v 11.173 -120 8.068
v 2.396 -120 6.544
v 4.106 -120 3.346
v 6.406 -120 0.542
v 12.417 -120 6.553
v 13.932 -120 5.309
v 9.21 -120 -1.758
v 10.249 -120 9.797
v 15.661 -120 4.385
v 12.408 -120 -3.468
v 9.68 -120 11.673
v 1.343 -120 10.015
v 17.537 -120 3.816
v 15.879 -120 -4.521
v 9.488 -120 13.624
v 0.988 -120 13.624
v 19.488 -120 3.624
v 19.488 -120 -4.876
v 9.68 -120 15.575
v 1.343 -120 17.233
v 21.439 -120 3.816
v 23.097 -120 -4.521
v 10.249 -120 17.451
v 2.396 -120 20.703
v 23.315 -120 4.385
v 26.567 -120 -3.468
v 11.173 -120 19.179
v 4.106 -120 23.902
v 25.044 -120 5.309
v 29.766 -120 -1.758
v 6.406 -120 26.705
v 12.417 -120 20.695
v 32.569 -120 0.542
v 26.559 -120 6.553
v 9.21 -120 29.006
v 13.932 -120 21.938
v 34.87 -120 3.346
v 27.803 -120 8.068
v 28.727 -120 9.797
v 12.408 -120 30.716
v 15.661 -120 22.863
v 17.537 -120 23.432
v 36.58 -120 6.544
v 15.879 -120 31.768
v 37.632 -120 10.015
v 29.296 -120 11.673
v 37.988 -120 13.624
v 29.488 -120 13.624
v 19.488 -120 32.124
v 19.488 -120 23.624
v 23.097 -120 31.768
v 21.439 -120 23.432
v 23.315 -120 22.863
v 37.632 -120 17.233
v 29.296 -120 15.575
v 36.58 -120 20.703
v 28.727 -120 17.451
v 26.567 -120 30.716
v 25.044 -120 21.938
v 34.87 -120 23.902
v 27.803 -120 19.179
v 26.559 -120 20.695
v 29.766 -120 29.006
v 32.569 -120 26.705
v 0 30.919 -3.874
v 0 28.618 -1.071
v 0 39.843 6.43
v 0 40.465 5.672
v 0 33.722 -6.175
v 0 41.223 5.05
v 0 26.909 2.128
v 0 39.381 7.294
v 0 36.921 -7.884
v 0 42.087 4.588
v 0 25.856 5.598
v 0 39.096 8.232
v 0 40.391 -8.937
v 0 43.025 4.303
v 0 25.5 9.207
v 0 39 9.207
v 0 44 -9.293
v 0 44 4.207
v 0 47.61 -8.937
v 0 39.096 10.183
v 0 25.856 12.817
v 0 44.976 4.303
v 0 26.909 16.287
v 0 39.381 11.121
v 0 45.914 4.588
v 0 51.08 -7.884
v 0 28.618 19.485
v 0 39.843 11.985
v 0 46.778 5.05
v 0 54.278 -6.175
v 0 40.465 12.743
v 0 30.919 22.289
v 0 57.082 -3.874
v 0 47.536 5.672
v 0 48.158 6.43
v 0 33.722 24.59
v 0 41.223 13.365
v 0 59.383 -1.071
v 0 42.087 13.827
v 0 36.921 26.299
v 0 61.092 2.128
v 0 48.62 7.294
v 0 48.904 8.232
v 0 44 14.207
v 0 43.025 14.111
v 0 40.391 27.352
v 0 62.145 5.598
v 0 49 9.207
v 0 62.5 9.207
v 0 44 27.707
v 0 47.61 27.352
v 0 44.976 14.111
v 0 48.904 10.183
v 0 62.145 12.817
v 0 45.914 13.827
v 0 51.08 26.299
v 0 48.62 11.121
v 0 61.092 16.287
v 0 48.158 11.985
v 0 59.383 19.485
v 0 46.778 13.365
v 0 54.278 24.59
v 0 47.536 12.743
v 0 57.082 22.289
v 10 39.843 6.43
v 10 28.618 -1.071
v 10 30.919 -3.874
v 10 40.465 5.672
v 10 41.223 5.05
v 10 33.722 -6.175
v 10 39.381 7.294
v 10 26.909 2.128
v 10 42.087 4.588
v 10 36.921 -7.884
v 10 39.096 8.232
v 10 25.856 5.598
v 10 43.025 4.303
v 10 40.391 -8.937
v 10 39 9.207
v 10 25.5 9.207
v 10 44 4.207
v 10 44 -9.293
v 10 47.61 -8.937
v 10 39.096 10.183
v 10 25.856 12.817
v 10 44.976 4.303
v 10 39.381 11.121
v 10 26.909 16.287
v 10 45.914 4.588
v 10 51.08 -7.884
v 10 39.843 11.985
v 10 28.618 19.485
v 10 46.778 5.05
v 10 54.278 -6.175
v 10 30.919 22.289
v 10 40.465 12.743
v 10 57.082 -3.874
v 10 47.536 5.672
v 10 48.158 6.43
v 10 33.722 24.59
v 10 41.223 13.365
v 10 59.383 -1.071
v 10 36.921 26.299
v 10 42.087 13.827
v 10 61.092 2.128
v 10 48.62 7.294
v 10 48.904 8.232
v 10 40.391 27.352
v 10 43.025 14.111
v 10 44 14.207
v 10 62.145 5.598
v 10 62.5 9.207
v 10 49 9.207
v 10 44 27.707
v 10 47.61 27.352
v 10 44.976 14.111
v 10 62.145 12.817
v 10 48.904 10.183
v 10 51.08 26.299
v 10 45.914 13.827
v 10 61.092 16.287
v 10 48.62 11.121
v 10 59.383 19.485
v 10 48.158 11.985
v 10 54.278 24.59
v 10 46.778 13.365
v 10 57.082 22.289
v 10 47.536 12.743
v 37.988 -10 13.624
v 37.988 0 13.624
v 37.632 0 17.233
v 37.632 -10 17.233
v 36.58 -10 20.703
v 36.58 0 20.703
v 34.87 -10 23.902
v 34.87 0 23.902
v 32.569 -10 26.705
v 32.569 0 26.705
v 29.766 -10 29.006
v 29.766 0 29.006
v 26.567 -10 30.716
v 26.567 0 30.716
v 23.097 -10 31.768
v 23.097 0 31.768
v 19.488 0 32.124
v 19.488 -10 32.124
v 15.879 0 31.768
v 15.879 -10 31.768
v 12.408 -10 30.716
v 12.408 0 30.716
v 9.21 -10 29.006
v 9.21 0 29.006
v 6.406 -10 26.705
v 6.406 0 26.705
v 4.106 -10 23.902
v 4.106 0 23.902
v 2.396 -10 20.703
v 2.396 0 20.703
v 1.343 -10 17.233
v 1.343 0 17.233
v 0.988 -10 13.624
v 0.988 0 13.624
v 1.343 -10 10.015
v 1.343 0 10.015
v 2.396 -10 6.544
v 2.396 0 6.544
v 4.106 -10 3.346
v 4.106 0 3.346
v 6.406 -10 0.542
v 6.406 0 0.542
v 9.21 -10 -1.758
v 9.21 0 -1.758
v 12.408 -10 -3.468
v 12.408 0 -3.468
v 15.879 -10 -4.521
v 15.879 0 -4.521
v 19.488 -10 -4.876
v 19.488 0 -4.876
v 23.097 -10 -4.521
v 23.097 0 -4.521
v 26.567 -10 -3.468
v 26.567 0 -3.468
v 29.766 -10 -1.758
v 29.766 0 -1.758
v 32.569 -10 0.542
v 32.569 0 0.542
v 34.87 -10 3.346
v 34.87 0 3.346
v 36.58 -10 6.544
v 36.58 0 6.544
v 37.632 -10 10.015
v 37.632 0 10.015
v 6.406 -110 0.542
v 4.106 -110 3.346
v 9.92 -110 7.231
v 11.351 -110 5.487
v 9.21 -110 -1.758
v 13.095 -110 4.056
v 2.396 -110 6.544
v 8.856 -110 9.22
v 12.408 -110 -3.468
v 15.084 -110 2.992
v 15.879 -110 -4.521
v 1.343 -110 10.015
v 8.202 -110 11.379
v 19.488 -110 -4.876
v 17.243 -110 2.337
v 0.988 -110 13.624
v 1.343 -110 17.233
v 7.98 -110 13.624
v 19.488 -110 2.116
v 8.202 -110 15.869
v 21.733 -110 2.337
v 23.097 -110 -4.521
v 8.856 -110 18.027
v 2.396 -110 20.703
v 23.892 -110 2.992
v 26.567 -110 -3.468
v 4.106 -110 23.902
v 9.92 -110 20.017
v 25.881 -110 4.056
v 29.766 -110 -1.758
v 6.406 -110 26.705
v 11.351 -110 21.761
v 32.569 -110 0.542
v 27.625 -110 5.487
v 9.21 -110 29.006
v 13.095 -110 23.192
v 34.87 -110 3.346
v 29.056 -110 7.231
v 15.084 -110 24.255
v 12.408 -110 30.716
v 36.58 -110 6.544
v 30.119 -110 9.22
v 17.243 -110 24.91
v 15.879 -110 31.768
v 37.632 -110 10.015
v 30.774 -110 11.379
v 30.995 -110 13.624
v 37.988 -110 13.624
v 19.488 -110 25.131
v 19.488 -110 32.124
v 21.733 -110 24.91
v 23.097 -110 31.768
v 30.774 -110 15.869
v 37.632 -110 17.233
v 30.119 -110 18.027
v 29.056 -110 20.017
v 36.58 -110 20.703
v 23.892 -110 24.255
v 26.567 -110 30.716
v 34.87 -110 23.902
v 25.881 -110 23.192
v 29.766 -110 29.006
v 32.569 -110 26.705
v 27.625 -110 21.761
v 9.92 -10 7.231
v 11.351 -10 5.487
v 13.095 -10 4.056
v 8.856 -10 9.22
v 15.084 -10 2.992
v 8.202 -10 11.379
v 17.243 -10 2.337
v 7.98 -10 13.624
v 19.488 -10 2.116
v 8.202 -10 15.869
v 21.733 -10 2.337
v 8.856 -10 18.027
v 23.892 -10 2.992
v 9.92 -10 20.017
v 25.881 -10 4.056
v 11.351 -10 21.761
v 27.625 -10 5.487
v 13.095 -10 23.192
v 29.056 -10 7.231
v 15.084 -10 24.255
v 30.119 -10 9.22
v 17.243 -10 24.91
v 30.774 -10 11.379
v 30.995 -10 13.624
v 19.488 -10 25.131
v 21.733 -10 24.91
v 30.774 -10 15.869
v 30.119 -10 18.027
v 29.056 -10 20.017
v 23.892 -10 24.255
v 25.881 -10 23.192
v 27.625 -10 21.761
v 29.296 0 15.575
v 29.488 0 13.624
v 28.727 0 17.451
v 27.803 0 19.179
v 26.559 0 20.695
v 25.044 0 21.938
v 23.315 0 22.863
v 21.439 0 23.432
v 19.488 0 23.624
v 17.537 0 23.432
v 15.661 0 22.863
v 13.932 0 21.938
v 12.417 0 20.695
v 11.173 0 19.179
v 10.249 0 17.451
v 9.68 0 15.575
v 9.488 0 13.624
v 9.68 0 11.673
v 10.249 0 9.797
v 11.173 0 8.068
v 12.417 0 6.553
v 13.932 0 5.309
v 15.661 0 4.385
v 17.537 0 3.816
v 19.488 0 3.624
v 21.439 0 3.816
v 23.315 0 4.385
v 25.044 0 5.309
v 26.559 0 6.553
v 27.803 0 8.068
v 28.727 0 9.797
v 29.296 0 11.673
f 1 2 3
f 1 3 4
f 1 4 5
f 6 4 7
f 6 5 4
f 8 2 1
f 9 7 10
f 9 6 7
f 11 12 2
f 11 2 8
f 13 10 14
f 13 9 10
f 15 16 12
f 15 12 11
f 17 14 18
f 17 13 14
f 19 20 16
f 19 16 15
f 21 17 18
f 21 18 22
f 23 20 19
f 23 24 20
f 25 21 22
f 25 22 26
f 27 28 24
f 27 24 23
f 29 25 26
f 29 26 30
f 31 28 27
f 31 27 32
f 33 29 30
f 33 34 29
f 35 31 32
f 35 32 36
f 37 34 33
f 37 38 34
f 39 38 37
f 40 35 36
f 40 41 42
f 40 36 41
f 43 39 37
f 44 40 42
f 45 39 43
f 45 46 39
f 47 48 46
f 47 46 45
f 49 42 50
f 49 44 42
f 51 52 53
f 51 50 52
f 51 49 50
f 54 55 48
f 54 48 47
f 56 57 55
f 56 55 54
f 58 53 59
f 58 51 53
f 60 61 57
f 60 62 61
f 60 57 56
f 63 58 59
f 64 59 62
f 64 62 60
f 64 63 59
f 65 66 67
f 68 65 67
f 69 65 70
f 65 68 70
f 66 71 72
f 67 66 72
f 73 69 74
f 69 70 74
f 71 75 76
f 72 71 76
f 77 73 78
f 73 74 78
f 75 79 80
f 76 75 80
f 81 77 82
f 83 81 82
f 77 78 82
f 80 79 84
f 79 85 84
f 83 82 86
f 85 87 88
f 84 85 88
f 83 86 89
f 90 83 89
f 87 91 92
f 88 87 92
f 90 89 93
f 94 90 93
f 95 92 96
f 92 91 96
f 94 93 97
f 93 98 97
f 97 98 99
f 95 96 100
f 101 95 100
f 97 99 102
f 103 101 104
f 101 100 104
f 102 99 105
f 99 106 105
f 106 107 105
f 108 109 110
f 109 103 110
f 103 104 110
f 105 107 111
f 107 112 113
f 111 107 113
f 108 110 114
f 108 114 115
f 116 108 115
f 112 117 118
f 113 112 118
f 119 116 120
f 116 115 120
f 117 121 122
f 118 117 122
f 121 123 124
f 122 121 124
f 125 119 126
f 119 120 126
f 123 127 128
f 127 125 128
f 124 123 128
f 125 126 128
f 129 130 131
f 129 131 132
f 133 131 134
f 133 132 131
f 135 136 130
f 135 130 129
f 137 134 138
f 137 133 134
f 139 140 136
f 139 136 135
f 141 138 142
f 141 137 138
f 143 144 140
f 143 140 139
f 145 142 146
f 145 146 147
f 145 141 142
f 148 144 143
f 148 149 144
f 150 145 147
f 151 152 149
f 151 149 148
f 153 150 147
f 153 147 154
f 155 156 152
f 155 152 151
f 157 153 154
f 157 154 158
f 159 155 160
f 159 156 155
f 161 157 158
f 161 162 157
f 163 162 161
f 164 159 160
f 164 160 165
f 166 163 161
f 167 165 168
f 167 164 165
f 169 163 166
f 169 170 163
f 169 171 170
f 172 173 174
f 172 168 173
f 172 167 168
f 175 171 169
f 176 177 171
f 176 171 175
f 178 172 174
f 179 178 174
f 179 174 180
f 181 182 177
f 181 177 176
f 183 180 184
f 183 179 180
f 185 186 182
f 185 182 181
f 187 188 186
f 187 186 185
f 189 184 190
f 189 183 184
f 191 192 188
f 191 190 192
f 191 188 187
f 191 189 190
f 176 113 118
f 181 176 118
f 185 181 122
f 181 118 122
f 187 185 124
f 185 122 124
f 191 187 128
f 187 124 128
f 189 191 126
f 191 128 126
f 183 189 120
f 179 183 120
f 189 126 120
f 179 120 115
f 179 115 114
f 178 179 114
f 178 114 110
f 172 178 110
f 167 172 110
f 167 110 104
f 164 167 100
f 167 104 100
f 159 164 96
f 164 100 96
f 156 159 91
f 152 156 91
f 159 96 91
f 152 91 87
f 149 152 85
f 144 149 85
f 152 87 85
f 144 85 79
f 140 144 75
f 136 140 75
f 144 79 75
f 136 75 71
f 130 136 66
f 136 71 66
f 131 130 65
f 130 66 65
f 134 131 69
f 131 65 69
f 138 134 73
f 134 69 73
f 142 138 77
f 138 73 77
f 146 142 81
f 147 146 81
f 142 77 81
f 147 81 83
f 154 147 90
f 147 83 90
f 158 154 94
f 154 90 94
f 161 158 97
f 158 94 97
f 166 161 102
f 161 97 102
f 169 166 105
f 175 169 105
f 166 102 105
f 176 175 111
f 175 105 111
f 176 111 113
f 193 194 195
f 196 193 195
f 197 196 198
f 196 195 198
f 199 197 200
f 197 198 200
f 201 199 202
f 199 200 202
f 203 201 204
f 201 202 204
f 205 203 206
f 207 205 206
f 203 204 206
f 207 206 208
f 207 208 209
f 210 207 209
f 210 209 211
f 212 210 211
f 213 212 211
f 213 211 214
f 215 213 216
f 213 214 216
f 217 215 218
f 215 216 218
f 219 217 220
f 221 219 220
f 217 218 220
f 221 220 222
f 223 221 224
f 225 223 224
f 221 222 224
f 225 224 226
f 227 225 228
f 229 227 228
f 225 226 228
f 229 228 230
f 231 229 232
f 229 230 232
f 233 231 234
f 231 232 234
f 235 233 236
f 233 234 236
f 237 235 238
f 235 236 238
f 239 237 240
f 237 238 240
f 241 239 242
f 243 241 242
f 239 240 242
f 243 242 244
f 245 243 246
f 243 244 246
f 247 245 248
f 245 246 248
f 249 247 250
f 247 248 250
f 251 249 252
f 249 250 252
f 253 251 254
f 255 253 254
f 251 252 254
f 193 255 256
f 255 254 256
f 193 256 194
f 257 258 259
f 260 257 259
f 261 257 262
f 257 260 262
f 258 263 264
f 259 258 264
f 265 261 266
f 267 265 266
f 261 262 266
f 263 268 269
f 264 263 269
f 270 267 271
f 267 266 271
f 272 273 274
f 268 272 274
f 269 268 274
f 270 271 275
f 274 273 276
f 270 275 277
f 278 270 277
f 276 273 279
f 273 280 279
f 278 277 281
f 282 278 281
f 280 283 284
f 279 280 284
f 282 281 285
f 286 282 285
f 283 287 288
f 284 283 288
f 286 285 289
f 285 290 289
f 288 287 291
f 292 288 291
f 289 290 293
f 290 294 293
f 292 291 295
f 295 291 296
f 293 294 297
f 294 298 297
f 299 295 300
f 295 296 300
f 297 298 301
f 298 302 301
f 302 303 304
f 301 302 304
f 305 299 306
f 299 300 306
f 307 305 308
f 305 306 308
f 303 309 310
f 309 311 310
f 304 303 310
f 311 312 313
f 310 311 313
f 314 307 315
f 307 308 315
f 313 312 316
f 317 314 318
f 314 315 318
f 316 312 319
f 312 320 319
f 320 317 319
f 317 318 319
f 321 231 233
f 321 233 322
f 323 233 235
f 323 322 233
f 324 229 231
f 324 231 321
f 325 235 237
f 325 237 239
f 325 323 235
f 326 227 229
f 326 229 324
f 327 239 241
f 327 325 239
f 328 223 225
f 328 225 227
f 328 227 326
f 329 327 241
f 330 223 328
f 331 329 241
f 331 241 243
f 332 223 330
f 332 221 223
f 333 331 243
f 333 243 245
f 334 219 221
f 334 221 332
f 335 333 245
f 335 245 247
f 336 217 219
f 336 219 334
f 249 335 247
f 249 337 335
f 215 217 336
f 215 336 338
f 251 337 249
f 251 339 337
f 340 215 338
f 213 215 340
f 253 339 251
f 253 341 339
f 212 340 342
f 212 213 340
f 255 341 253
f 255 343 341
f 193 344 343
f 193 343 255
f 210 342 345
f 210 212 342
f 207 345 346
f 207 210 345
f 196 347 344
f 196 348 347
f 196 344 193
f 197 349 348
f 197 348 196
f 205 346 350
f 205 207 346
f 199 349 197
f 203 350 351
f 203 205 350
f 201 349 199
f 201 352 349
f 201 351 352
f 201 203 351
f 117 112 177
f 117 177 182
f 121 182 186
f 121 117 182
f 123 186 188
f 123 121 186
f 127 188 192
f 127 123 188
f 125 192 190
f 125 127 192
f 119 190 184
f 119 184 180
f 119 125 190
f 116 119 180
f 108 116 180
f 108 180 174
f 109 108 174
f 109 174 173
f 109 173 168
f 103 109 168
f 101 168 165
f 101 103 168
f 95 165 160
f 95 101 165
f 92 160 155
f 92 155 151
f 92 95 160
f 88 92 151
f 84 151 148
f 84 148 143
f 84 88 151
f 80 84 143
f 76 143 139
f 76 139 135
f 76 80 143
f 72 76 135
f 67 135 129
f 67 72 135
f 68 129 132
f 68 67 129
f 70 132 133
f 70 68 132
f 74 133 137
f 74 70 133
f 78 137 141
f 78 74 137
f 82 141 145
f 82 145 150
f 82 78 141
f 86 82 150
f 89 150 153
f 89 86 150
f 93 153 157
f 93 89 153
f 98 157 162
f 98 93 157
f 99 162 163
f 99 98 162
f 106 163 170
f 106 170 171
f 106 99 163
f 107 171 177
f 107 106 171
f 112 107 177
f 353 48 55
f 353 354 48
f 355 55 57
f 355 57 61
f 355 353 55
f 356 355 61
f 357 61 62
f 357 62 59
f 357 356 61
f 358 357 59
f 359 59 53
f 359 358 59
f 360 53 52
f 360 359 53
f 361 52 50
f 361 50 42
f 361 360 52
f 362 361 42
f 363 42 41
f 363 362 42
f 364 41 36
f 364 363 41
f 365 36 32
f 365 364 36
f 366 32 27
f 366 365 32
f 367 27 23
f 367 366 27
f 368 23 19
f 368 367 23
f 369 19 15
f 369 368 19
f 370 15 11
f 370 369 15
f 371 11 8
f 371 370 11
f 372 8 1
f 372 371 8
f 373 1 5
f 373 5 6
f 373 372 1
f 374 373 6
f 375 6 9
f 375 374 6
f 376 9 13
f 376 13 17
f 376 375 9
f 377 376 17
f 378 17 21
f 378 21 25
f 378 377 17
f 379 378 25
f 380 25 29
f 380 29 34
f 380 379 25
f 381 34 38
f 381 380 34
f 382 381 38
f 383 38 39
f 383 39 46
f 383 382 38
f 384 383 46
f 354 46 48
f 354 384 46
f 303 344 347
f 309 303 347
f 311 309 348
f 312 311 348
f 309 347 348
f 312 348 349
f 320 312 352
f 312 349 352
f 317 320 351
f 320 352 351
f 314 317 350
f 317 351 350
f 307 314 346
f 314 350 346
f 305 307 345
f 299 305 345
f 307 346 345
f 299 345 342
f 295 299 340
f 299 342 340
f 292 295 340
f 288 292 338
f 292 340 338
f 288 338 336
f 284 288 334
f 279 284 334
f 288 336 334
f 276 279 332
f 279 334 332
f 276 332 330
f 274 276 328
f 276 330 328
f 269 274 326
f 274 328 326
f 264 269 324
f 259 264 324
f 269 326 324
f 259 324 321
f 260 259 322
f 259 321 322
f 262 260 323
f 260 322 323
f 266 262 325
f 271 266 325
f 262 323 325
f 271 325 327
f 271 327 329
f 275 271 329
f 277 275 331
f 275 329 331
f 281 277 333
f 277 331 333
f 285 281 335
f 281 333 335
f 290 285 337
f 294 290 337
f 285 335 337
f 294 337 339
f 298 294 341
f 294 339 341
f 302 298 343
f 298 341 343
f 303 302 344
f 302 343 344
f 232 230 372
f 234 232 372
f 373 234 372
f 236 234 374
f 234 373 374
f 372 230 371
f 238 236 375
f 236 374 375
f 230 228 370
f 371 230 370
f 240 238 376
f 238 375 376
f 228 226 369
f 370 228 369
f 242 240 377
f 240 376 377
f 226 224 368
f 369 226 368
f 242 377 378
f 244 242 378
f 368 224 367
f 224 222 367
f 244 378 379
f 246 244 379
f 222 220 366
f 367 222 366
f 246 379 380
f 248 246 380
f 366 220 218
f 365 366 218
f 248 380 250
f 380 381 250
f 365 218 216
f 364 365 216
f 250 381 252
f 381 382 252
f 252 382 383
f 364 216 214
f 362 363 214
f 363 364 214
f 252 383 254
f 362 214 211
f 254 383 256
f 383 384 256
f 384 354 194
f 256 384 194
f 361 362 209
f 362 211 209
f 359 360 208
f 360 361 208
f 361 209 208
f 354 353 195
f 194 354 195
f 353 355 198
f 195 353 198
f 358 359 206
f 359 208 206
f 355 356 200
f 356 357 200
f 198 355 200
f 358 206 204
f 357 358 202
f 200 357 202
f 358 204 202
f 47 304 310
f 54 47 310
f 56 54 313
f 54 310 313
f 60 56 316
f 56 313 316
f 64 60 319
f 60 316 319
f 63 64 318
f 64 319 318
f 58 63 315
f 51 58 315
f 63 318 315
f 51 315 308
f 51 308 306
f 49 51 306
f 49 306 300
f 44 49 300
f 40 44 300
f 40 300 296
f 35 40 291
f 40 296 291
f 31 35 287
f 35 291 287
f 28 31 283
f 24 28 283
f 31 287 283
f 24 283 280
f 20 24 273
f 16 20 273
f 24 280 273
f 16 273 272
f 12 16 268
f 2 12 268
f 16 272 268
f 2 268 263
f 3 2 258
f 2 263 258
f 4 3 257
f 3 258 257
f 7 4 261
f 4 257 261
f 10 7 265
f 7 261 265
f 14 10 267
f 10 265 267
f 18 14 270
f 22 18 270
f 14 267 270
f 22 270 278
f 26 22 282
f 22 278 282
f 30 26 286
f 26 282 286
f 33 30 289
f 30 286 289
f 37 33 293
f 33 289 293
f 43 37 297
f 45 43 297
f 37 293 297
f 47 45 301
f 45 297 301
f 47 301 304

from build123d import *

# Parameters (mm, degrees)
F0_R     = 18.5
F0_R_2   = 10
F1_DEPTH = 10
F2_R     = 11.5074062797
F3_DEPTH = 100
F4_DEPTH = 120
F5_R     = 18.5
F5_R_2   = 11.5074062797
F5_R_3   = 10
F6_DEPTH = 10
F7_R     = 18.5
F7_R_2   = 5
F8_DEPTH = 10


with BuildPart() as f1:
    # F0 (on Front) → F1 (new body)
    with BuildSketch(Plane.XZ):
        with Locations((19.4878280163, 13.6237423867)):
            Circle(F0_R)
        with Locations((19.4878280163, 13.6237423867)):
            Circle(F0_R_2, mode=Mode.SUBTRACT)
        with Locations((19.4878280163, 13.6237423867)):
            Circle(F0_R_2)
    extrude(amount=F1_DEPTH)

    # F2 (on face) → F3 (join)
    with BuildSketch(Plane.XZ.offset(10)):
        with Locations((19.4878280163, 13.6237423867)):
            Circle(F2_R)
    extrude(amount=F3_DEPTH)

    # F0 (on Front) → F4 (cut)
    with BuildSketch(Plane.XZ):
        with Locations((19.4878280163, 13.6237423867)):
            Circle(F0_R_2)
    extrude(amount=F4_DEPTH, mode=Mode.SUBTRACT)

    # F5 (on face) → F6 (join)
    with BuildSketch(Plane.XZ.offset(110)):
        with Locations((19.4878280163, 13.6237423867)):
            Circle(F5_R)
        with Locations((19.4878280163, 13.6237423867)):
            Circle(F5_R_2, mode=Mode.SUBTRACT)
        with Locations((19.4878280163, 13.6237423867)):
            Circle(F5_R_2)
        with Locations((19.4878280163, 13.6237423867)):
            Circle(F5_R_3, mode=Mode.SUBTRACT)
    extrude(amount=F6_DEPTH)


with BuildPart() as f8:
    # F7 (on Right) → F8 (new body)
    with BuildSketch(Plane.YZ):
        with Locations((44.0003760159, 9.2073623091)):
            Circle(F7_R)
        with Locations((44.0003760159, 9.2073623091)):
            Circle(F7_R_2, mode=Mode.SUBTRACT)
    extrude(amount=F8_DEPTH)


solid = Compound([f1.part, f8.part])
